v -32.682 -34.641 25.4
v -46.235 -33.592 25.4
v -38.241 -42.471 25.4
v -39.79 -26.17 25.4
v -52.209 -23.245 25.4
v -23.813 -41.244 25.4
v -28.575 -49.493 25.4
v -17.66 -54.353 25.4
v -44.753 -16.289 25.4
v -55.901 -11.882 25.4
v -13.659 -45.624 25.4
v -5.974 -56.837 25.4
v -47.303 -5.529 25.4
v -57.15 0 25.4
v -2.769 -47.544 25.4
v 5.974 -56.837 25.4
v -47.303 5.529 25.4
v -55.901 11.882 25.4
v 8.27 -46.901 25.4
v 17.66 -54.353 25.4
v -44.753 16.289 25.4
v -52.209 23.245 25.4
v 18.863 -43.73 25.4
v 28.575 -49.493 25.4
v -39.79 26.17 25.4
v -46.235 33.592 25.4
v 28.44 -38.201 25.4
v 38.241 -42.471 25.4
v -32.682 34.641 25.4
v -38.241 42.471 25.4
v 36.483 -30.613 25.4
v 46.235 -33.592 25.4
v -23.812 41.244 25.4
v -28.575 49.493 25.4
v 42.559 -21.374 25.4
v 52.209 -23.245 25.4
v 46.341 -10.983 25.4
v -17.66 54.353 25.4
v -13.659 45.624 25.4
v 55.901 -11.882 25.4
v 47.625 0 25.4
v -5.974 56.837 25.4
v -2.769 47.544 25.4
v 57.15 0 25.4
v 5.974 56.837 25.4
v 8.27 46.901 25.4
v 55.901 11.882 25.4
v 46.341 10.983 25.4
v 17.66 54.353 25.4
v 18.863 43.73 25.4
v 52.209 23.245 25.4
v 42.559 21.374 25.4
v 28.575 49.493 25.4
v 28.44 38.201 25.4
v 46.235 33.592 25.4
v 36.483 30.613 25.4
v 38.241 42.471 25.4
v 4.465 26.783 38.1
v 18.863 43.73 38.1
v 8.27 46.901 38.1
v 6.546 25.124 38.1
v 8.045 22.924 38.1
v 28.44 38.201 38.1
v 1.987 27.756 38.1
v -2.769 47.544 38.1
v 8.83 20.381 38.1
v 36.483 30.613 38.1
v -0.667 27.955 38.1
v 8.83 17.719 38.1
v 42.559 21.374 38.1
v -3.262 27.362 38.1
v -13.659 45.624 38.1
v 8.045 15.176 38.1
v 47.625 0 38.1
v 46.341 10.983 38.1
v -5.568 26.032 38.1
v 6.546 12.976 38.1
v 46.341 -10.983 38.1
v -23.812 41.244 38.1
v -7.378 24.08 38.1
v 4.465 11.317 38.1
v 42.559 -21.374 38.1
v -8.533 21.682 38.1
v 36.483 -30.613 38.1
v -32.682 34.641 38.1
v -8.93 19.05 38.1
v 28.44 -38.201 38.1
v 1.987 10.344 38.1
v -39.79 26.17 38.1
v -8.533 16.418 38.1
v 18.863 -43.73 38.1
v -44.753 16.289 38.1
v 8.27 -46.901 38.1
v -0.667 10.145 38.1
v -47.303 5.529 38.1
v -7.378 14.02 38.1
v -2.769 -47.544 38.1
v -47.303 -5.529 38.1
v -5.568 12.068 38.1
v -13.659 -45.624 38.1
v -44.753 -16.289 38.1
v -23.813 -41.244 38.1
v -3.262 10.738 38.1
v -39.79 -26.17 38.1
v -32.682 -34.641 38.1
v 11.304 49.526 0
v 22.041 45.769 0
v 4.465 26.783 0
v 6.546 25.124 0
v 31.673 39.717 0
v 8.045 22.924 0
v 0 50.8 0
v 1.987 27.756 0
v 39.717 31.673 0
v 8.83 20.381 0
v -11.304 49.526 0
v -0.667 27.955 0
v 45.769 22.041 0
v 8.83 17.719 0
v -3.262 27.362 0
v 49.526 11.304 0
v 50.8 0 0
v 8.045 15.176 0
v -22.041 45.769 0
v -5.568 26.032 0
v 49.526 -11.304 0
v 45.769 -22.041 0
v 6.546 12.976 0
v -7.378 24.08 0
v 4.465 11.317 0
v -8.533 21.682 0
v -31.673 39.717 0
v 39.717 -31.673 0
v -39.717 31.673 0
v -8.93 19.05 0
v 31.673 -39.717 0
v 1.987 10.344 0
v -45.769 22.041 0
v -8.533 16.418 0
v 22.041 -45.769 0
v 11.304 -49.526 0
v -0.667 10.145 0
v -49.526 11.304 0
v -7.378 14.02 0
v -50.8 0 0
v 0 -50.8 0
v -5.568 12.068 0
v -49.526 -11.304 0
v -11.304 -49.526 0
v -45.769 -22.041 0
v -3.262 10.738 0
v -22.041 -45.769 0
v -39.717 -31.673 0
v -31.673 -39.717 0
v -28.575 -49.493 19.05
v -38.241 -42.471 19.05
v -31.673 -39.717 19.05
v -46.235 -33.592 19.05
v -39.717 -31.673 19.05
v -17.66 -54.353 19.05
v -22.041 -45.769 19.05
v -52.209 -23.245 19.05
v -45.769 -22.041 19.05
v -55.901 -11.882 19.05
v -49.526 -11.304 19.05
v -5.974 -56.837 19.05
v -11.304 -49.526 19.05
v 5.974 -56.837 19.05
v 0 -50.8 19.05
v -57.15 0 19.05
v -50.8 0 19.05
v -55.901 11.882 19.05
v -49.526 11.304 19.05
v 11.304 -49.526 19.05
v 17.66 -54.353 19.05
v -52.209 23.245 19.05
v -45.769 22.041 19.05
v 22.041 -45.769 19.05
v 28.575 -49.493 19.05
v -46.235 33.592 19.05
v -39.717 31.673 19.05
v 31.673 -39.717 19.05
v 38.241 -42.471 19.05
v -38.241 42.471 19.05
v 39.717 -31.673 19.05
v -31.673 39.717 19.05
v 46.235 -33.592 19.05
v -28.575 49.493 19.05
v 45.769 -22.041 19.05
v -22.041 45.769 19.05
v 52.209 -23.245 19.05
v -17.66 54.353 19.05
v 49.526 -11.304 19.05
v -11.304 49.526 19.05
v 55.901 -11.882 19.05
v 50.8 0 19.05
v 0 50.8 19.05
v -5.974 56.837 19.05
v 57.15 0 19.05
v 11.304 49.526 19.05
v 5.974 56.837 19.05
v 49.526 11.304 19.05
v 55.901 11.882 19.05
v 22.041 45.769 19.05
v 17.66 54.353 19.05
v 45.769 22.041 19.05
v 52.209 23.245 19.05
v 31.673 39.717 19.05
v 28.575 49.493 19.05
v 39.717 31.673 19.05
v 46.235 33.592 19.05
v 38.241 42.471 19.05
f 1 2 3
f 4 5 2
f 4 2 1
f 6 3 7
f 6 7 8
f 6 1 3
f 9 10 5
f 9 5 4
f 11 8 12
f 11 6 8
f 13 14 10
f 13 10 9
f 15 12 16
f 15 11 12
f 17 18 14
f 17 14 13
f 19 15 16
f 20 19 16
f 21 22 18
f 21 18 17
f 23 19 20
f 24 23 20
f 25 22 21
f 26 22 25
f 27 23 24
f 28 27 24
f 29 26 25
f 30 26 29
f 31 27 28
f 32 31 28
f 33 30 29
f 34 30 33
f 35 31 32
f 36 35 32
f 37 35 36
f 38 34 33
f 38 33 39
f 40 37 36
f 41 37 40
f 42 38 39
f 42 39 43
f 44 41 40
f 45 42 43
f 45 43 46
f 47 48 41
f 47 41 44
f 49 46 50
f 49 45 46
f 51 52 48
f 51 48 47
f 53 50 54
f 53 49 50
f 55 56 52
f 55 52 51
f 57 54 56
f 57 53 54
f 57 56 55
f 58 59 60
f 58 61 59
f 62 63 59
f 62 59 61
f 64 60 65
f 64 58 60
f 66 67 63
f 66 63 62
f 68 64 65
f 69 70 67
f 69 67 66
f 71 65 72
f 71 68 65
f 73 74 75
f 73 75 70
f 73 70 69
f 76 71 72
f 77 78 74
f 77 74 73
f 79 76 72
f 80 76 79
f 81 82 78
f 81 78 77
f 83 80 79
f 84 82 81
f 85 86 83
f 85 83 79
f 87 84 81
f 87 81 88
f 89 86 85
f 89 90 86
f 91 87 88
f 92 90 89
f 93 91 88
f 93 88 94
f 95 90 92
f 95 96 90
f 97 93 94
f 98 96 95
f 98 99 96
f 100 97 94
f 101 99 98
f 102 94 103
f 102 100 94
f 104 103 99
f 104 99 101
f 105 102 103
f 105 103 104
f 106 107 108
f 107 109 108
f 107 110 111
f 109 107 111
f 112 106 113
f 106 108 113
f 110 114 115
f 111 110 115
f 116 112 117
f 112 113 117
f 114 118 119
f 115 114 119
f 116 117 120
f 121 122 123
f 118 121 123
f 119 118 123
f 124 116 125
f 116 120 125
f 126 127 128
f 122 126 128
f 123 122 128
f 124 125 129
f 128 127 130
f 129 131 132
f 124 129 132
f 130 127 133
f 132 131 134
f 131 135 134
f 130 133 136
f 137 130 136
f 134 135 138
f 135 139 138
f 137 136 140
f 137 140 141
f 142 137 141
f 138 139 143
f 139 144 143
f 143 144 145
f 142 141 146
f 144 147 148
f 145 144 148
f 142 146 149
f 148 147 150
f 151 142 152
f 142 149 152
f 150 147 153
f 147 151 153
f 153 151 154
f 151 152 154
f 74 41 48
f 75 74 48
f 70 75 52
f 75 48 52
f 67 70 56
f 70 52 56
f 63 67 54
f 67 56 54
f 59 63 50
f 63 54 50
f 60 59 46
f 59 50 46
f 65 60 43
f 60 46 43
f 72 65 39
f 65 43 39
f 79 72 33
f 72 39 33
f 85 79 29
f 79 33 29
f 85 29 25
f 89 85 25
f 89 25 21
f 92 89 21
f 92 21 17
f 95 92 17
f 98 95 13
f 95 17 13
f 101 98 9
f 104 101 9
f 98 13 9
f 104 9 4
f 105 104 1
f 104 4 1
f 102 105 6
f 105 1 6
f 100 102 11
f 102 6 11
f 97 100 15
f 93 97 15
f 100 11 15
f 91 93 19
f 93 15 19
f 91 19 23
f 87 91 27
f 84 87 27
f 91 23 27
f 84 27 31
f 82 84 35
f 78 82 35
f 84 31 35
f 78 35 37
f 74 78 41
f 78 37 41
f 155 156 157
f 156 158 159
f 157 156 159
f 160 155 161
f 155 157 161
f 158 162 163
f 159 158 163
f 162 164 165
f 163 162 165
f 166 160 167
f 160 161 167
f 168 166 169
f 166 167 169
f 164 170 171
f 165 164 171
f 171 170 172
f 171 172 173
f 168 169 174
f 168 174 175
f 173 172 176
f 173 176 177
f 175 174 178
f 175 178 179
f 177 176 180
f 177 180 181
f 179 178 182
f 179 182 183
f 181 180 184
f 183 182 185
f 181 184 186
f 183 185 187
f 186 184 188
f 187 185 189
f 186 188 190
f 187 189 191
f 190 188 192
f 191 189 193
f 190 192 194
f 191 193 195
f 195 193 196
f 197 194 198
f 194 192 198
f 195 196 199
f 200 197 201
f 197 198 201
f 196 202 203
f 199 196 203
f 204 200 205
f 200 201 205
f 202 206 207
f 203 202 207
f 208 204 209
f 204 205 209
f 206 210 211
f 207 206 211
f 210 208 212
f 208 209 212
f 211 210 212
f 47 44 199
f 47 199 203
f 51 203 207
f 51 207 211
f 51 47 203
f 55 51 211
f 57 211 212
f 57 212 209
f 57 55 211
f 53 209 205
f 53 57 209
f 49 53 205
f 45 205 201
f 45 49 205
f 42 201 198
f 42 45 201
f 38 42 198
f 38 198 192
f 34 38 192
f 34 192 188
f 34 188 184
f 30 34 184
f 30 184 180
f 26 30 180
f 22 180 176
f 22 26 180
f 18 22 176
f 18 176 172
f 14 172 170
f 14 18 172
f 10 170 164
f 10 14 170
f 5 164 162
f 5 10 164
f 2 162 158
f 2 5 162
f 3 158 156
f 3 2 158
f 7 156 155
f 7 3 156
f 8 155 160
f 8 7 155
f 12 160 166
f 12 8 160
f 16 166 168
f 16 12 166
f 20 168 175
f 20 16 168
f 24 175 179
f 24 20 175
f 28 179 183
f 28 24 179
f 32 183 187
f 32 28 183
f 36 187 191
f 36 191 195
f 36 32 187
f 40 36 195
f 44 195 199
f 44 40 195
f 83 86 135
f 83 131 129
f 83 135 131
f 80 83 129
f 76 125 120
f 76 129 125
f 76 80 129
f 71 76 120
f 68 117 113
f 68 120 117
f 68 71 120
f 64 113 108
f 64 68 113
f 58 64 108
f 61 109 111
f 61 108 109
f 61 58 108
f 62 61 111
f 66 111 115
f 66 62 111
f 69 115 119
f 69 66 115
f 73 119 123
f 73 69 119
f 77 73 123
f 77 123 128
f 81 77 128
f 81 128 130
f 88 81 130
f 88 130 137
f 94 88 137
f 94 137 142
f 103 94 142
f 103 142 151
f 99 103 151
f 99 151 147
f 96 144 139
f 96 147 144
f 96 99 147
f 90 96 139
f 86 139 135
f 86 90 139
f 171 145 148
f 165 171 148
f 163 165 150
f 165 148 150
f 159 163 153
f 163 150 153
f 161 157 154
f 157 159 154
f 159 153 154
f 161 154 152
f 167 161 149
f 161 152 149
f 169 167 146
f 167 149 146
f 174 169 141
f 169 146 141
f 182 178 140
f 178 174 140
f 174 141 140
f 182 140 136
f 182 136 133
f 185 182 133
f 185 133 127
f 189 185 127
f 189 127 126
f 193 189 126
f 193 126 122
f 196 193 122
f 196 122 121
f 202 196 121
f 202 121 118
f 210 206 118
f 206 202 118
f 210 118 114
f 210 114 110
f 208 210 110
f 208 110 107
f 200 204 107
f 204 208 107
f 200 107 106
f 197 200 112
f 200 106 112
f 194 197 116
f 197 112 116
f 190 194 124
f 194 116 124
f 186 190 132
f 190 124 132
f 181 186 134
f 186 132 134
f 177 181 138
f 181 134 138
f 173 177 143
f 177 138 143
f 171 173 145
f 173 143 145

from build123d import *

# Parameters (mm, degrees)
SKETCH1_R               = 50.8
BOSS_EXTRUDE1_DEPTH     = 38.1
CUT_EXTRUDE_THIN2_START = -12.7
SKETCH22_R              = 50.8
SKETCH22_R_2            = 47.625
CUT_EXTRUDE_THIN2_DEPTH = 12.7
SKETCH24_R              = 57.15
BOSS_EXTRUDE3_DEPTH     = 6.35
CUT_EXTRUDE5_DEPTH      = 90.352420225
CUT_EXTRUDE5_DEPTH_BACK = 90.352420225
SKETCH20_R              = 8.9296875


with BuildPart() as part:
    # Sketch1 → Boss-Extrude1 (new body)
    with BuildSketch(Plane.XY):
        with Locations(Location((0, 0, 0), (0, 0, 180))):
            Circle(SKETCH1_R)
    extrude(amount=BOSS_EXTRUDE1_DEPTH)

    # Sketch22 → Cut-Extrude-Thin2 (cut)
    with BuildSketch(Plane.XY.offset(38.1).offset(CUT_EXTRUDE_THIN2_START)):
        Circle(SKETCH22_R)
        Circle(SKETCH22_R_2, mode=Mode.SUBTRACT)
    extrude(amount=CUT_EXTRUDE_THIN2_DEPTH, mode=Mode.SUBTRACT)

    # Sketch24 → Boss-Extrude3 (add)
    with BuildSketch(Plane.XY.offset(25.4)):
        Circle(SKETCH24_R)
    extrude(amount=-BOSS_EXTRUDE3_DEPTH)

    # Sketch20 → Cut-Extrude5 (cut, two sides: drawn at the far end of the back side and taken through both)
    with BuildSketch(Plane(origin=(0, 0, 0), x_dir=(-1, 0, 0), z_dir=(0, 0, -1)).offset(-CUT_EXTRUDE5_DEPTH_BACK)):
        with Locations((0, 19.05)):
            Circle(SKETCH20_R)
    extrude(amount=CUT_EXTRUDE5_DEPTH + CUT_EXTRUDE5_DEPTH_BACK, mode=Mode.SUBTRACT)


solid = part.part
